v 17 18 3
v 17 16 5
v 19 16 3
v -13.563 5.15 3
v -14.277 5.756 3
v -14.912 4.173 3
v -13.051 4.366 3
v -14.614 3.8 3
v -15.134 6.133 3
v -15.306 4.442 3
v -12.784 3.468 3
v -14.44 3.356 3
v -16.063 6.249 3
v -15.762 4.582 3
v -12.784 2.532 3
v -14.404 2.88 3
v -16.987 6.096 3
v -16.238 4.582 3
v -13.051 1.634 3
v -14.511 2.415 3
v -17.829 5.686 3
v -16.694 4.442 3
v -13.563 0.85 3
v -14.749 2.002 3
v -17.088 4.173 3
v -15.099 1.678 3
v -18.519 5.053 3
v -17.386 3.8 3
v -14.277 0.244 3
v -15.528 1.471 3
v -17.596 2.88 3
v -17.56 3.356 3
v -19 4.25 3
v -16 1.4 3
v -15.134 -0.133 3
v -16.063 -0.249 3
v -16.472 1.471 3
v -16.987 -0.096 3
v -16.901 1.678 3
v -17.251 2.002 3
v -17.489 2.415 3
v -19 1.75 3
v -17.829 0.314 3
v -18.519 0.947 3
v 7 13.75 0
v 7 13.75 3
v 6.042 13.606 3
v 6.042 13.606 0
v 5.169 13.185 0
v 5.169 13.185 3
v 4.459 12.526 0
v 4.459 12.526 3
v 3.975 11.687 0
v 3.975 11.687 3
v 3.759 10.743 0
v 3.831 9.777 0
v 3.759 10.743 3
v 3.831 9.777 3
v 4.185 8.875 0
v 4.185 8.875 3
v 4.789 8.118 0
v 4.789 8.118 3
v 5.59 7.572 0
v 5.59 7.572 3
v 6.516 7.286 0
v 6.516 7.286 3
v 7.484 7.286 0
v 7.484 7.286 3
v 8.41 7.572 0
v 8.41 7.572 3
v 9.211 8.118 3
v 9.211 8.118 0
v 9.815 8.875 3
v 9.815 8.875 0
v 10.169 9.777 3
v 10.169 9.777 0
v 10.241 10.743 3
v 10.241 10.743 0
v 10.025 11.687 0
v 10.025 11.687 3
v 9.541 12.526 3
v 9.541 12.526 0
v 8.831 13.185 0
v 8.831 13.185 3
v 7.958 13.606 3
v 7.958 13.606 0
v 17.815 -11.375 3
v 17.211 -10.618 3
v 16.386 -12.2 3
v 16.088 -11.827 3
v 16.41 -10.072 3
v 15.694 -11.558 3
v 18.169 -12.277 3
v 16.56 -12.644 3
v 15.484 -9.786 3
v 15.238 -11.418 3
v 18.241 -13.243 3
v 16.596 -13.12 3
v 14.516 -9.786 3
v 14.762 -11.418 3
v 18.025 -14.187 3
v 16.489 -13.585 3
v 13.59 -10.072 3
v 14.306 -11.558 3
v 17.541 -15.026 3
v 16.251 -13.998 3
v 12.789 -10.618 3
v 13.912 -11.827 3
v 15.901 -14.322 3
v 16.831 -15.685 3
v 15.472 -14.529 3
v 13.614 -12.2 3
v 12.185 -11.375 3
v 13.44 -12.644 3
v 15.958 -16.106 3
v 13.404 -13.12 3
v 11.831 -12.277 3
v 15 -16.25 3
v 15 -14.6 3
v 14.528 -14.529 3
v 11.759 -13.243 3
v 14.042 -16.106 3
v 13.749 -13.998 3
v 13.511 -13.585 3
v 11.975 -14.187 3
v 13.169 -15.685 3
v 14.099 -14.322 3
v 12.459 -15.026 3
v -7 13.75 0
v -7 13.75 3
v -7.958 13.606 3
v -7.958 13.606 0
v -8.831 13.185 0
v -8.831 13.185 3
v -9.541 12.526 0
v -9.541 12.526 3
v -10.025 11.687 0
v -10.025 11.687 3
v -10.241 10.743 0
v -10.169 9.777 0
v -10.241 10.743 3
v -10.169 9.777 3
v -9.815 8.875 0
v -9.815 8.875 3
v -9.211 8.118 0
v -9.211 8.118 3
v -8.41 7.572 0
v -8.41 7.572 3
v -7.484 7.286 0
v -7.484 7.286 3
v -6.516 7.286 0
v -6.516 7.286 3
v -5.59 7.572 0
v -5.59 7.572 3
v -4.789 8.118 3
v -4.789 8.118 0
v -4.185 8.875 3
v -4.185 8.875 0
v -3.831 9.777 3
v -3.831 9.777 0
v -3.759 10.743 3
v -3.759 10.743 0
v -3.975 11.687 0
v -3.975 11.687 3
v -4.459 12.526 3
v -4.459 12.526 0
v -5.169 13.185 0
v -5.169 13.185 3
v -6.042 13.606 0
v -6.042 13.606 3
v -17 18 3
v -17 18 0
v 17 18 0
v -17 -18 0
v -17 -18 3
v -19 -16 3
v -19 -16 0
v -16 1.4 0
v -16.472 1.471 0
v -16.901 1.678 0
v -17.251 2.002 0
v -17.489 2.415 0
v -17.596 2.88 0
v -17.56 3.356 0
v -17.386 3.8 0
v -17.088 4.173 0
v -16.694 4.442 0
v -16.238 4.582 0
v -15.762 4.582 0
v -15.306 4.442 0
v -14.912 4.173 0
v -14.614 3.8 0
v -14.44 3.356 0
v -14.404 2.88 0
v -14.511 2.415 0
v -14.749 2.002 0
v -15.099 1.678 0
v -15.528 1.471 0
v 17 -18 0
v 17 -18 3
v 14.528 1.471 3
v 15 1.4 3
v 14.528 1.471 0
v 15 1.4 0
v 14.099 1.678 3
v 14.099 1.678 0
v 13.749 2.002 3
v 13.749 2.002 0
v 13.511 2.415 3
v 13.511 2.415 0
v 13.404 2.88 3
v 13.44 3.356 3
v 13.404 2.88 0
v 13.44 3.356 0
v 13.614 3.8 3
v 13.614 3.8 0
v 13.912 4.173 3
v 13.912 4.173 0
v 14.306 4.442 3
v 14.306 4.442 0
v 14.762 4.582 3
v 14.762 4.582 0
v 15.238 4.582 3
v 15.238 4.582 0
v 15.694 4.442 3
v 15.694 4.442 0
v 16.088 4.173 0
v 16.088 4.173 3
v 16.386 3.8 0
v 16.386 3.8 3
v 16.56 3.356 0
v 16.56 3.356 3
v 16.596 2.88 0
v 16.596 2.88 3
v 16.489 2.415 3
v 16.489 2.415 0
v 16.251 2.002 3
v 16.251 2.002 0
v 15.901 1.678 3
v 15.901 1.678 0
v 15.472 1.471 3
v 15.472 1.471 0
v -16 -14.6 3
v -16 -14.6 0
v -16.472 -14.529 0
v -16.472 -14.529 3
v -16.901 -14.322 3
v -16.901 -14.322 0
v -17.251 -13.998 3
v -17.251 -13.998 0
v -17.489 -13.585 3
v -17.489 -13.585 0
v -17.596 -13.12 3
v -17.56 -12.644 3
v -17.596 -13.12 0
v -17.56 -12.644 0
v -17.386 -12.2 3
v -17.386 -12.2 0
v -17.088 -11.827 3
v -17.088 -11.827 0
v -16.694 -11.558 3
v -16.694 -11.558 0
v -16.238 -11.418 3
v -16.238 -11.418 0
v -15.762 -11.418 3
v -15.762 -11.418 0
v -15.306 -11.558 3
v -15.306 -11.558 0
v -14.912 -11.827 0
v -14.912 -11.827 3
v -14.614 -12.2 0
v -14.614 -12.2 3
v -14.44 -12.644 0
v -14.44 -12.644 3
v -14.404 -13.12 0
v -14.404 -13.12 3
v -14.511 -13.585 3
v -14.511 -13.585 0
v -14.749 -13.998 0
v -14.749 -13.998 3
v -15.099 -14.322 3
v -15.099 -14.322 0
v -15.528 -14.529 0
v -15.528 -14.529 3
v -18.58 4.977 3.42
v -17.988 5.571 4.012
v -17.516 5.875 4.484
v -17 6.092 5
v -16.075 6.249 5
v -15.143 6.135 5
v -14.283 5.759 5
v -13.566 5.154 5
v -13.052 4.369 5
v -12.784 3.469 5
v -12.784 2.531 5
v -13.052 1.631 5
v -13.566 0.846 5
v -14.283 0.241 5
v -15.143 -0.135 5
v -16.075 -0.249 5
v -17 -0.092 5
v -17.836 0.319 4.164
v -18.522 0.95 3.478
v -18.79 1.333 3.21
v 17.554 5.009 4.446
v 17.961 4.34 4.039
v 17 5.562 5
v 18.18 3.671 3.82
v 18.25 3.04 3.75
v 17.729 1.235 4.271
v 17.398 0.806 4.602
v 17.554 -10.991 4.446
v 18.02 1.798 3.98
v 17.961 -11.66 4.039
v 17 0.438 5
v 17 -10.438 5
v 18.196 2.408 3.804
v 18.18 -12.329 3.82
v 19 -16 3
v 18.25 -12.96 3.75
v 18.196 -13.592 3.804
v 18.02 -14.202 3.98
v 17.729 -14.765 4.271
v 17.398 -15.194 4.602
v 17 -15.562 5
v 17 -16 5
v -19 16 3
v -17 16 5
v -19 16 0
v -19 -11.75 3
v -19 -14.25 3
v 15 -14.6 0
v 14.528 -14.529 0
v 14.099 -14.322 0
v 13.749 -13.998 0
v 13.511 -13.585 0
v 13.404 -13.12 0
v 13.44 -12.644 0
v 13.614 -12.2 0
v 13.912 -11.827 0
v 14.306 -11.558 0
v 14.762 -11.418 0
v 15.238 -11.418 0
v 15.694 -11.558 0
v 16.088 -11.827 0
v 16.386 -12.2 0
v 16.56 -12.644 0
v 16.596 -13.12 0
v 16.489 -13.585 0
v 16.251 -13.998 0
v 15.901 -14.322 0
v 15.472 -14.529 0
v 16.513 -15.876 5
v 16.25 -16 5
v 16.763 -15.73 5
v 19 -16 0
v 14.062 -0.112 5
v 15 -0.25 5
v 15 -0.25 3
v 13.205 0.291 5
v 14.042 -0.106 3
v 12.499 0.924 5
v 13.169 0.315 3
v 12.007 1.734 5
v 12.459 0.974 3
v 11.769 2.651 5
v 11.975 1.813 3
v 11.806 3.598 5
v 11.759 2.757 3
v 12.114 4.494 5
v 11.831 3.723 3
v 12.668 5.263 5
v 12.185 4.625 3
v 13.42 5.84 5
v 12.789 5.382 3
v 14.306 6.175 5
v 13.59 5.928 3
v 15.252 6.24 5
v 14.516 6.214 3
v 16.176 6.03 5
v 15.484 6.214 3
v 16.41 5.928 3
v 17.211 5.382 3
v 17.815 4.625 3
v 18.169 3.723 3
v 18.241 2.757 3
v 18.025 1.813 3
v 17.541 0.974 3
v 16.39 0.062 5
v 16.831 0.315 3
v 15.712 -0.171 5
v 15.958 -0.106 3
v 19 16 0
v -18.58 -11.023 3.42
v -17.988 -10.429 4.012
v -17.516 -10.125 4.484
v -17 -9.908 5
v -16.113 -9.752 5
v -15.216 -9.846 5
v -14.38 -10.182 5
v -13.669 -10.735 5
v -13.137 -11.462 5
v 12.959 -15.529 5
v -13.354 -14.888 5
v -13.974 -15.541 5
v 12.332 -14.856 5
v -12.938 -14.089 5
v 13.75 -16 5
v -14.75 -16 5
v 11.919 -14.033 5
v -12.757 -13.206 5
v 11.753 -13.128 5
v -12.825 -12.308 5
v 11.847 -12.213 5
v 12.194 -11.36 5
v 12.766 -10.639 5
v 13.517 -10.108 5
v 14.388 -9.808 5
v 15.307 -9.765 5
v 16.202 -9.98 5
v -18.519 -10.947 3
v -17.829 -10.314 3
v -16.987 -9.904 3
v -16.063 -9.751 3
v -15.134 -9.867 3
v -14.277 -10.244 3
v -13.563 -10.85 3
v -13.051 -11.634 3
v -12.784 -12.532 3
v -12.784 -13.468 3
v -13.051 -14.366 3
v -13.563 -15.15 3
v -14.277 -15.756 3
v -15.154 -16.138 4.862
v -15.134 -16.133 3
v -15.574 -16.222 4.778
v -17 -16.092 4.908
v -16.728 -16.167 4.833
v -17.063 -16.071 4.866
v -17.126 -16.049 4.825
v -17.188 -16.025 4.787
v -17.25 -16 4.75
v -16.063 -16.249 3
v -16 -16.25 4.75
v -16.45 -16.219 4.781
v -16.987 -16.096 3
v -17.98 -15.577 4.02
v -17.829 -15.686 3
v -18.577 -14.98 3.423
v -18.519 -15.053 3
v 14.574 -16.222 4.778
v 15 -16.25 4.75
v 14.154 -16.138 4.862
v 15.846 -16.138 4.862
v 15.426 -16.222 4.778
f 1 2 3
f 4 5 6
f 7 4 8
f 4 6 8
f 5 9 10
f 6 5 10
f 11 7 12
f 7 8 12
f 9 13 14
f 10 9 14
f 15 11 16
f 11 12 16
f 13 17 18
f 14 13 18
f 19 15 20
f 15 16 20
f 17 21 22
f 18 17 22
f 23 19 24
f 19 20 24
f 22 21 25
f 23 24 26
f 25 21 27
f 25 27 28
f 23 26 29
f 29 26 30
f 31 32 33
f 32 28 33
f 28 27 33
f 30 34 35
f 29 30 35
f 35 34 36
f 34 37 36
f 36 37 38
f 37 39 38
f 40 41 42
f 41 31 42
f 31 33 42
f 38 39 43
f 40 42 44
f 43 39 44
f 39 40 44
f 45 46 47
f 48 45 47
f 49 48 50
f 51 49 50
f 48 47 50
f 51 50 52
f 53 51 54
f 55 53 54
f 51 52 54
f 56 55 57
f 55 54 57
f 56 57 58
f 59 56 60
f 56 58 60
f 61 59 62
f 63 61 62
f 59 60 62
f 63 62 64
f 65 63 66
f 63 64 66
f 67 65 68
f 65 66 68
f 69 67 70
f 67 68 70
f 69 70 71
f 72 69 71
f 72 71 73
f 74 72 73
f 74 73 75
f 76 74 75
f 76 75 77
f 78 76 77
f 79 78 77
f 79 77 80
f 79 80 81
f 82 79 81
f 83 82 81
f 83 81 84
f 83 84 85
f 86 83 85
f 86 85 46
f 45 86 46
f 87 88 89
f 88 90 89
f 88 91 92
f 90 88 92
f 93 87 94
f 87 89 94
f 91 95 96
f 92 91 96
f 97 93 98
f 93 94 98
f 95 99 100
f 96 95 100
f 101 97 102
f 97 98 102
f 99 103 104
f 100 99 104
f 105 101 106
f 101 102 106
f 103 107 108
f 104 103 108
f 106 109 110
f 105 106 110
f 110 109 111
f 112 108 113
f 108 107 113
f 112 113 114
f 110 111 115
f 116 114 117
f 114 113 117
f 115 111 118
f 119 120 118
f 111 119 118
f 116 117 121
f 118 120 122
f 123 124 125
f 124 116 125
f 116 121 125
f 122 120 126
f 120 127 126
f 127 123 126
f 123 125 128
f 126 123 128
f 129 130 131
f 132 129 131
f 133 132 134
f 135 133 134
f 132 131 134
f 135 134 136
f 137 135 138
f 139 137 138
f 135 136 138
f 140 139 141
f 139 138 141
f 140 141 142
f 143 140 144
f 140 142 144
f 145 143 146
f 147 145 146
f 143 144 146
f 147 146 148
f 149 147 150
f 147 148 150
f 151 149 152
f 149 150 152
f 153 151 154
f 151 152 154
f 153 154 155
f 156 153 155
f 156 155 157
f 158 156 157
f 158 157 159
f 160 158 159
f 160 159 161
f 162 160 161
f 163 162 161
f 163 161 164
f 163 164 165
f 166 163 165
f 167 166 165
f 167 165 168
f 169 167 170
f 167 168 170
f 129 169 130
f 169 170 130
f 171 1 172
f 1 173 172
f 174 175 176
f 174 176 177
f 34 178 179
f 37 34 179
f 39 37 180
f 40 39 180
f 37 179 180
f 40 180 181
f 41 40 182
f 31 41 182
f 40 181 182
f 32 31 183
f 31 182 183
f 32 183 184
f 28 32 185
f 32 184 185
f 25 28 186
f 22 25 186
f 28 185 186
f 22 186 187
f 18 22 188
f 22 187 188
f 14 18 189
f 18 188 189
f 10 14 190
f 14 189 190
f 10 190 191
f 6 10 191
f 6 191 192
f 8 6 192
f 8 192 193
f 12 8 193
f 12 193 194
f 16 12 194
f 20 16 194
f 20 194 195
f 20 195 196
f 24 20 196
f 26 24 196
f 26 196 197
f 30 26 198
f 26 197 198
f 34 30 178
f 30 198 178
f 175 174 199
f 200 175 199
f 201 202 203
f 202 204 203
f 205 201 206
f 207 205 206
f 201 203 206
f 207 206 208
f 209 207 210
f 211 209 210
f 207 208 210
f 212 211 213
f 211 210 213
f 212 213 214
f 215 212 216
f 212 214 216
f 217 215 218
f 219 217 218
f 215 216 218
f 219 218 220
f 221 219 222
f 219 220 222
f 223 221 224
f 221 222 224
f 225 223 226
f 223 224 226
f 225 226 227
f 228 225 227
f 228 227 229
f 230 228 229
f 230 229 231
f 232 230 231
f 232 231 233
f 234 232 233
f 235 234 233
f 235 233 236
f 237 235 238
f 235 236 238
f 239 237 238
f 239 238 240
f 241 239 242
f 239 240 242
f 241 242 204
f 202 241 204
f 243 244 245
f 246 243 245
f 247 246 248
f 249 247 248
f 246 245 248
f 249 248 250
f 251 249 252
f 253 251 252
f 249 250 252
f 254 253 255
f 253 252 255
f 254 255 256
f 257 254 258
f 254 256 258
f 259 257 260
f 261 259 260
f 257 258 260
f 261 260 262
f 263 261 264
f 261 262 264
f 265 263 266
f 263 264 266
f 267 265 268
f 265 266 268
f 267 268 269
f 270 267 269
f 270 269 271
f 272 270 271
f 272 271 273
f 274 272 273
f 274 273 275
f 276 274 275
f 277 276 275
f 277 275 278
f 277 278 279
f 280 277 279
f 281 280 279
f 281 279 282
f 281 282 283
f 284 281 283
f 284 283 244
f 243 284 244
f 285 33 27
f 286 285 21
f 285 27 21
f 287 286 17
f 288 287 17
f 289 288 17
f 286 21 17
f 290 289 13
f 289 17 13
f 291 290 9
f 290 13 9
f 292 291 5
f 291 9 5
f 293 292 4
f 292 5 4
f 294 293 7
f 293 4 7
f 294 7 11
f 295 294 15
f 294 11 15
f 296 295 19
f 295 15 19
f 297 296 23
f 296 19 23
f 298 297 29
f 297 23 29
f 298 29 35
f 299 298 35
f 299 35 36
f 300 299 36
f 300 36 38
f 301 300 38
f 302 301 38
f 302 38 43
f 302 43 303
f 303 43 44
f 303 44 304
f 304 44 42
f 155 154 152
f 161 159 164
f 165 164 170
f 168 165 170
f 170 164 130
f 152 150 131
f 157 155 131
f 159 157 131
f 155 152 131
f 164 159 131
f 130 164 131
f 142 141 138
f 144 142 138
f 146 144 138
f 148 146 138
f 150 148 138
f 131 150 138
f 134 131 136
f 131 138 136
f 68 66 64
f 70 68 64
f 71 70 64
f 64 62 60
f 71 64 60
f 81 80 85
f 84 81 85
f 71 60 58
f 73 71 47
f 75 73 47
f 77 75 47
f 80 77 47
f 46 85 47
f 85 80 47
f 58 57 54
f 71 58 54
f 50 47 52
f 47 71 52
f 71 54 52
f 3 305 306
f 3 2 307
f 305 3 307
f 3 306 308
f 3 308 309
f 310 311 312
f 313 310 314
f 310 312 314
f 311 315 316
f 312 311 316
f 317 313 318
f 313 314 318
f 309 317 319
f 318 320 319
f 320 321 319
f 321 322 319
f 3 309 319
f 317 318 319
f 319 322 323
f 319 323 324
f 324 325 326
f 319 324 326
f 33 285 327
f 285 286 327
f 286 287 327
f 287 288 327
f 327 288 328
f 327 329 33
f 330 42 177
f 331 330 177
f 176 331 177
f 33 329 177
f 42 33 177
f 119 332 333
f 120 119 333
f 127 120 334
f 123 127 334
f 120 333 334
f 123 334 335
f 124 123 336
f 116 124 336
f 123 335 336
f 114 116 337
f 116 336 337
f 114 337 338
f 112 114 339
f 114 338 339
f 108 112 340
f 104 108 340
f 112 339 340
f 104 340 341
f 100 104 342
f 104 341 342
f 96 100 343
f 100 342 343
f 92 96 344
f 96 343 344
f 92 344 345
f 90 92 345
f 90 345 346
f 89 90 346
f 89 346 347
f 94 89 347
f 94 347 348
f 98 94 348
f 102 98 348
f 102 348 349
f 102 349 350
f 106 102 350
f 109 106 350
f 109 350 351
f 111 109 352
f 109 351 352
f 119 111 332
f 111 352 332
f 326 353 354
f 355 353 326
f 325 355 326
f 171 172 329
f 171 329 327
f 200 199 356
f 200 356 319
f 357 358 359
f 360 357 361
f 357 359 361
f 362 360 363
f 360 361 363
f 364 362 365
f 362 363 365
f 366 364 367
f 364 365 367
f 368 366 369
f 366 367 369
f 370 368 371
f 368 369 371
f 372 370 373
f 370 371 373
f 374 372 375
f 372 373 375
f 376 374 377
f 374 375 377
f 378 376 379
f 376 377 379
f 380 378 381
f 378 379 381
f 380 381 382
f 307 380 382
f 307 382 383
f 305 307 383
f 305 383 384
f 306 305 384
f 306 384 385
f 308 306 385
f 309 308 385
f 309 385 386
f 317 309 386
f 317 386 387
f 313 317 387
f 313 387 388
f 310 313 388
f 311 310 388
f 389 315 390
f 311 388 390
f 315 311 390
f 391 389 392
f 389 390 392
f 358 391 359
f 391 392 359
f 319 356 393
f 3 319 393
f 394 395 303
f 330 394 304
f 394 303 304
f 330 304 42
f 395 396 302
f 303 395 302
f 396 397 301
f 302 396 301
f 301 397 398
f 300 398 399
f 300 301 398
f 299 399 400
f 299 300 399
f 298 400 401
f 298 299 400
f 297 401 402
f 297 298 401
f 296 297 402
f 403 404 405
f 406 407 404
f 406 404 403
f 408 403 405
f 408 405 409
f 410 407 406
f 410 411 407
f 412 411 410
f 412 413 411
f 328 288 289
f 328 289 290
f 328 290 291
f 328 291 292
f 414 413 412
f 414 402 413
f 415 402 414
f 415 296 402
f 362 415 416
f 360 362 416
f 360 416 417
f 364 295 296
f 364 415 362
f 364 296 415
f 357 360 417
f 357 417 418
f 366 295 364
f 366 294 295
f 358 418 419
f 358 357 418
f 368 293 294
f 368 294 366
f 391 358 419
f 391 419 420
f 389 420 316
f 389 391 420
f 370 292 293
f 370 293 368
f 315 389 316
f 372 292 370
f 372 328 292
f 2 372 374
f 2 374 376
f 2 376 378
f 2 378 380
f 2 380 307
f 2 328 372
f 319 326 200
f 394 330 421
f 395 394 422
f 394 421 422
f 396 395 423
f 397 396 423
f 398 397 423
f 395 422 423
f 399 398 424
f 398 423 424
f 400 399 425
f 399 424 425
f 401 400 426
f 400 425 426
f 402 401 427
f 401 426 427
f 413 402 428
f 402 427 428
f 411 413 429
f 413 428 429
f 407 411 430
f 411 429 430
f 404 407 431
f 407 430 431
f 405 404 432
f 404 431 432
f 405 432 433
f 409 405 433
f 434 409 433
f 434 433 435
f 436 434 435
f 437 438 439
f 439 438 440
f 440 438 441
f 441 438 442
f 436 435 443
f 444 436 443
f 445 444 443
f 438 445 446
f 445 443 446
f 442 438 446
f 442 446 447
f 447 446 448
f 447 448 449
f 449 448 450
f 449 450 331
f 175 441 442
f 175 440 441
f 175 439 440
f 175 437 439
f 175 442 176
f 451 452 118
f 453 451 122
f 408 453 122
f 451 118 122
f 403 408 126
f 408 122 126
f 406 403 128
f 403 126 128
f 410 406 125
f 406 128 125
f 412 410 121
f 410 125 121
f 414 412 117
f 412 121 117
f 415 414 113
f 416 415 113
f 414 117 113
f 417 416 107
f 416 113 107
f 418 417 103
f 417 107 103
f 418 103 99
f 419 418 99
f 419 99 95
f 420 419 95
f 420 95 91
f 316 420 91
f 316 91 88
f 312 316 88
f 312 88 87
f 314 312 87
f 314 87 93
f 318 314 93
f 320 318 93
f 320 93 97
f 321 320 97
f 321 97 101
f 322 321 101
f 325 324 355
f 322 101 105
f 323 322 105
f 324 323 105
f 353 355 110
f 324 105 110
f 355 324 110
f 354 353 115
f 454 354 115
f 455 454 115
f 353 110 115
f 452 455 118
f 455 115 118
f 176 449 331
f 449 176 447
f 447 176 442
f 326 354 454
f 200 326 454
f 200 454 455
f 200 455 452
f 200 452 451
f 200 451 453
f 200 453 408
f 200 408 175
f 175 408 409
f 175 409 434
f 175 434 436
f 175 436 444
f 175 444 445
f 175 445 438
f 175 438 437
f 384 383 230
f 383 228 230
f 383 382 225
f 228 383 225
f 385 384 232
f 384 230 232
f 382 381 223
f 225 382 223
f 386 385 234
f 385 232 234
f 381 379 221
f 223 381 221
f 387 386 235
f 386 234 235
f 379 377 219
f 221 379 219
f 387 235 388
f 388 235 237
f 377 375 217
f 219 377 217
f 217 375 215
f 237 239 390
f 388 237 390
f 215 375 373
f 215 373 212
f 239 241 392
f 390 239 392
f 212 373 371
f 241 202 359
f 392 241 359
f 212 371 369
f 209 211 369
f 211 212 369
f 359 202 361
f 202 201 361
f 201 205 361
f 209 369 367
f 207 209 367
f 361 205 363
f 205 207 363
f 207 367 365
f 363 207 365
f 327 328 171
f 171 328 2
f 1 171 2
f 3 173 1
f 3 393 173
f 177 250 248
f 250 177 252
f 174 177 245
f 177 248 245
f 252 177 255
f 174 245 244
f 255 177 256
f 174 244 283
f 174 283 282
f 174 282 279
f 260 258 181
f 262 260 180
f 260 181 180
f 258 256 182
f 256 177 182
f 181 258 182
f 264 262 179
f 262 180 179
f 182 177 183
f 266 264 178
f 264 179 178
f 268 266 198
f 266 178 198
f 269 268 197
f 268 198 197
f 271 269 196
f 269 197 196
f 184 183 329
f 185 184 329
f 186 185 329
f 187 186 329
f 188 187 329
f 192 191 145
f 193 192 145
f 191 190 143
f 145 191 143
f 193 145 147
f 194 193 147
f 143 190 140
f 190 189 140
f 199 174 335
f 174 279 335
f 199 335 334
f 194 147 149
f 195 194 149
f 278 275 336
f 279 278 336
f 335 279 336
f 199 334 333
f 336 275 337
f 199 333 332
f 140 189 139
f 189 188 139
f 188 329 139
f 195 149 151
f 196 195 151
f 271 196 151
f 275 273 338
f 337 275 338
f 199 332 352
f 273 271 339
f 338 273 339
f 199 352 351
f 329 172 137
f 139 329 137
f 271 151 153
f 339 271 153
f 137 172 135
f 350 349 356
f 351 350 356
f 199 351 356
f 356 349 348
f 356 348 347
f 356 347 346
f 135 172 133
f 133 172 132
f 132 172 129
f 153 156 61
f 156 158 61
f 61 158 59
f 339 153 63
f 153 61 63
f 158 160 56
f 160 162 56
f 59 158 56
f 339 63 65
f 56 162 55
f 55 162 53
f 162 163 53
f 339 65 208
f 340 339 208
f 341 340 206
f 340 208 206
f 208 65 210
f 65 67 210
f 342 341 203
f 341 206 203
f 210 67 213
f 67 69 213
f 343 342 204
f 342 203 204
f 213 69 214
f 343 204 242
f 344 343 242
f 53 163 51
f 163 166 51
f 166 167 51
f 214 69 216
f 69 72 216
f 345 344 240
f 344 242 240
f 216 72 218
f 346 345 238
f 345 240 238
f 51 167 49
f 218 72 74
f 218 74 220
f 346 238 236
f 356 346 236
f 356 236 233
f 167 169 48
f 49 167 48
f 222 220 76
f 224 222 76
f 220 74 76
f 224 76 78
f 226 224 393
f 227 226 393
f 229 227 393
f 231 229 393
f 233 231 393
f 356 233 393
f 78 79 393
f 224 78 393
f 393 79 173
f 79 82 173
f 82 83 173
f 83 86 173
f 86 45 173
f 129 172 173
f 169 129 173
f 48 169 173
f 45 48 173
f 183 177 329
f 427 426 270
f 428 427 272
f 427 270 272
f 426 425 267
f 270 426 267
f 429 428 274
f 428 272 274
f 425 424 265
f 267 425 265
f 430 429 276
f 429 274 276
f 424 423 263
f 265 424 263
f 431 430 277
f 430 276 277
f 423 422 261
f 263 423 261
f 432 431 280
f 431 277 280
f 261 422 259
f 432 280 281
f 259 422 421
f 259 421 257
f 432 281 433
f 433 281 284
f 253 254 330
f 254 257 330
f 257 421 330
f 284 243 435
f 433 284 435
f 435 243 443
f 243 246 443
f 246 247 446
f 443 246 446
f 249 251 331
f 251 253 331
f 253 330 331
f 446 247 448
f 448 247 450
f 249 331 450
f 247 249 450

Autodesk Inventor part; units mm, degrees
ref_plane "YZ Plane" through (0, 0, 0) normal (1, 0, 0) x (0, 1, 0)
ref_plane "XZ Plane" through (0, 0, 0) normal (0, 1, 0) x (-1, 0, 0)
ref_plane "XY Plane" through (0, 0, 0) normal (0, 0, 1) x (1, 0, 0)
sketch "スケッチ1" plane through (0, 0, 0) normal (0, 0, 1) x (1, 0, 0)
  line L0 (-19, -18) -> (19, -18)
  line L1 (19, -18) -> (19, 18)
  line L2 (19, 18) -> (-19, 18)
  line L3 (-19, 18) -> (-19, -18)
  line L4 (-19, -18) -> (19, 18) construction
  line L5 (19, -18) -> (-19, 18) construction
  point P0 (0, 0)
  dimension "d0" = 38
  dimension "d1" = 36
extrude "押し出し1" add sketch "スケッチ1" along normal blind 5
chamfer "面取り1" distance 2 angle 45 8 edges at (0, 18, 5) (19, 0, 5) (0, -18, 5) (-19, 0, 5) (19, -18, 2.5) (-19, -18, 2.5) (-19, 18, 2.5) (19, 18, 2.5)
sketch "スケッチ2" plane through (0, 0, 5) normal (0, 0, 1) x (1, 0, 0)
  line L0 (-19, -18) -> (19, -18) projected
  line L1 (19, -18) -> (19, 18) projected
  line L2 (-16, -13) -> (15, -13)
  line L3 (15, -13) -> (15, 3)
  line L4 (15, 3) -> (-16, 3)
  line L5 (-16, 3) -> (-16, -13)
  line L6 (-16, -13) -> (15, 3) construction
  line L7 (15, -13) -> (-16, 3) construction
  point P0 (0, 0)
  point P1 (-0.5, -5)
  dimension "d4" = 31
  dimension "d5" = 16
  dimension "d6" = 5
  dimension "d7" = 4
hole "穴1" at (-16, 3, 5) at (-16, -13, 5) at (15, -13, 5) at (15, 3, 5) direction (0, 0, -1) diameter 3.2 depth 6 counterbore diameter 6.5 counterbore depth 2
sketch "スケッチ3" plane through (0, 0, 0) normal (0, 0, -1) x (-1, 0, 0)
  line L0 (19, 16) -> (19, -16) projected
  line L1 (-17, 18) -> (17, 18) projected
  point P0 (0, 0)
  point P1 (-7, 10.5)
  point P2 (7, 10.5)
  dimension "d18" = 7.5
  dimension "d19" = 12
  dimension "d20" = 14
hole "穴2" at (7, 10.5, 0) at (-7, 10.5, 0) direction (0, 0, 1) diameter 6.5 depth 3
properties part number "Print_Parts_S2"
